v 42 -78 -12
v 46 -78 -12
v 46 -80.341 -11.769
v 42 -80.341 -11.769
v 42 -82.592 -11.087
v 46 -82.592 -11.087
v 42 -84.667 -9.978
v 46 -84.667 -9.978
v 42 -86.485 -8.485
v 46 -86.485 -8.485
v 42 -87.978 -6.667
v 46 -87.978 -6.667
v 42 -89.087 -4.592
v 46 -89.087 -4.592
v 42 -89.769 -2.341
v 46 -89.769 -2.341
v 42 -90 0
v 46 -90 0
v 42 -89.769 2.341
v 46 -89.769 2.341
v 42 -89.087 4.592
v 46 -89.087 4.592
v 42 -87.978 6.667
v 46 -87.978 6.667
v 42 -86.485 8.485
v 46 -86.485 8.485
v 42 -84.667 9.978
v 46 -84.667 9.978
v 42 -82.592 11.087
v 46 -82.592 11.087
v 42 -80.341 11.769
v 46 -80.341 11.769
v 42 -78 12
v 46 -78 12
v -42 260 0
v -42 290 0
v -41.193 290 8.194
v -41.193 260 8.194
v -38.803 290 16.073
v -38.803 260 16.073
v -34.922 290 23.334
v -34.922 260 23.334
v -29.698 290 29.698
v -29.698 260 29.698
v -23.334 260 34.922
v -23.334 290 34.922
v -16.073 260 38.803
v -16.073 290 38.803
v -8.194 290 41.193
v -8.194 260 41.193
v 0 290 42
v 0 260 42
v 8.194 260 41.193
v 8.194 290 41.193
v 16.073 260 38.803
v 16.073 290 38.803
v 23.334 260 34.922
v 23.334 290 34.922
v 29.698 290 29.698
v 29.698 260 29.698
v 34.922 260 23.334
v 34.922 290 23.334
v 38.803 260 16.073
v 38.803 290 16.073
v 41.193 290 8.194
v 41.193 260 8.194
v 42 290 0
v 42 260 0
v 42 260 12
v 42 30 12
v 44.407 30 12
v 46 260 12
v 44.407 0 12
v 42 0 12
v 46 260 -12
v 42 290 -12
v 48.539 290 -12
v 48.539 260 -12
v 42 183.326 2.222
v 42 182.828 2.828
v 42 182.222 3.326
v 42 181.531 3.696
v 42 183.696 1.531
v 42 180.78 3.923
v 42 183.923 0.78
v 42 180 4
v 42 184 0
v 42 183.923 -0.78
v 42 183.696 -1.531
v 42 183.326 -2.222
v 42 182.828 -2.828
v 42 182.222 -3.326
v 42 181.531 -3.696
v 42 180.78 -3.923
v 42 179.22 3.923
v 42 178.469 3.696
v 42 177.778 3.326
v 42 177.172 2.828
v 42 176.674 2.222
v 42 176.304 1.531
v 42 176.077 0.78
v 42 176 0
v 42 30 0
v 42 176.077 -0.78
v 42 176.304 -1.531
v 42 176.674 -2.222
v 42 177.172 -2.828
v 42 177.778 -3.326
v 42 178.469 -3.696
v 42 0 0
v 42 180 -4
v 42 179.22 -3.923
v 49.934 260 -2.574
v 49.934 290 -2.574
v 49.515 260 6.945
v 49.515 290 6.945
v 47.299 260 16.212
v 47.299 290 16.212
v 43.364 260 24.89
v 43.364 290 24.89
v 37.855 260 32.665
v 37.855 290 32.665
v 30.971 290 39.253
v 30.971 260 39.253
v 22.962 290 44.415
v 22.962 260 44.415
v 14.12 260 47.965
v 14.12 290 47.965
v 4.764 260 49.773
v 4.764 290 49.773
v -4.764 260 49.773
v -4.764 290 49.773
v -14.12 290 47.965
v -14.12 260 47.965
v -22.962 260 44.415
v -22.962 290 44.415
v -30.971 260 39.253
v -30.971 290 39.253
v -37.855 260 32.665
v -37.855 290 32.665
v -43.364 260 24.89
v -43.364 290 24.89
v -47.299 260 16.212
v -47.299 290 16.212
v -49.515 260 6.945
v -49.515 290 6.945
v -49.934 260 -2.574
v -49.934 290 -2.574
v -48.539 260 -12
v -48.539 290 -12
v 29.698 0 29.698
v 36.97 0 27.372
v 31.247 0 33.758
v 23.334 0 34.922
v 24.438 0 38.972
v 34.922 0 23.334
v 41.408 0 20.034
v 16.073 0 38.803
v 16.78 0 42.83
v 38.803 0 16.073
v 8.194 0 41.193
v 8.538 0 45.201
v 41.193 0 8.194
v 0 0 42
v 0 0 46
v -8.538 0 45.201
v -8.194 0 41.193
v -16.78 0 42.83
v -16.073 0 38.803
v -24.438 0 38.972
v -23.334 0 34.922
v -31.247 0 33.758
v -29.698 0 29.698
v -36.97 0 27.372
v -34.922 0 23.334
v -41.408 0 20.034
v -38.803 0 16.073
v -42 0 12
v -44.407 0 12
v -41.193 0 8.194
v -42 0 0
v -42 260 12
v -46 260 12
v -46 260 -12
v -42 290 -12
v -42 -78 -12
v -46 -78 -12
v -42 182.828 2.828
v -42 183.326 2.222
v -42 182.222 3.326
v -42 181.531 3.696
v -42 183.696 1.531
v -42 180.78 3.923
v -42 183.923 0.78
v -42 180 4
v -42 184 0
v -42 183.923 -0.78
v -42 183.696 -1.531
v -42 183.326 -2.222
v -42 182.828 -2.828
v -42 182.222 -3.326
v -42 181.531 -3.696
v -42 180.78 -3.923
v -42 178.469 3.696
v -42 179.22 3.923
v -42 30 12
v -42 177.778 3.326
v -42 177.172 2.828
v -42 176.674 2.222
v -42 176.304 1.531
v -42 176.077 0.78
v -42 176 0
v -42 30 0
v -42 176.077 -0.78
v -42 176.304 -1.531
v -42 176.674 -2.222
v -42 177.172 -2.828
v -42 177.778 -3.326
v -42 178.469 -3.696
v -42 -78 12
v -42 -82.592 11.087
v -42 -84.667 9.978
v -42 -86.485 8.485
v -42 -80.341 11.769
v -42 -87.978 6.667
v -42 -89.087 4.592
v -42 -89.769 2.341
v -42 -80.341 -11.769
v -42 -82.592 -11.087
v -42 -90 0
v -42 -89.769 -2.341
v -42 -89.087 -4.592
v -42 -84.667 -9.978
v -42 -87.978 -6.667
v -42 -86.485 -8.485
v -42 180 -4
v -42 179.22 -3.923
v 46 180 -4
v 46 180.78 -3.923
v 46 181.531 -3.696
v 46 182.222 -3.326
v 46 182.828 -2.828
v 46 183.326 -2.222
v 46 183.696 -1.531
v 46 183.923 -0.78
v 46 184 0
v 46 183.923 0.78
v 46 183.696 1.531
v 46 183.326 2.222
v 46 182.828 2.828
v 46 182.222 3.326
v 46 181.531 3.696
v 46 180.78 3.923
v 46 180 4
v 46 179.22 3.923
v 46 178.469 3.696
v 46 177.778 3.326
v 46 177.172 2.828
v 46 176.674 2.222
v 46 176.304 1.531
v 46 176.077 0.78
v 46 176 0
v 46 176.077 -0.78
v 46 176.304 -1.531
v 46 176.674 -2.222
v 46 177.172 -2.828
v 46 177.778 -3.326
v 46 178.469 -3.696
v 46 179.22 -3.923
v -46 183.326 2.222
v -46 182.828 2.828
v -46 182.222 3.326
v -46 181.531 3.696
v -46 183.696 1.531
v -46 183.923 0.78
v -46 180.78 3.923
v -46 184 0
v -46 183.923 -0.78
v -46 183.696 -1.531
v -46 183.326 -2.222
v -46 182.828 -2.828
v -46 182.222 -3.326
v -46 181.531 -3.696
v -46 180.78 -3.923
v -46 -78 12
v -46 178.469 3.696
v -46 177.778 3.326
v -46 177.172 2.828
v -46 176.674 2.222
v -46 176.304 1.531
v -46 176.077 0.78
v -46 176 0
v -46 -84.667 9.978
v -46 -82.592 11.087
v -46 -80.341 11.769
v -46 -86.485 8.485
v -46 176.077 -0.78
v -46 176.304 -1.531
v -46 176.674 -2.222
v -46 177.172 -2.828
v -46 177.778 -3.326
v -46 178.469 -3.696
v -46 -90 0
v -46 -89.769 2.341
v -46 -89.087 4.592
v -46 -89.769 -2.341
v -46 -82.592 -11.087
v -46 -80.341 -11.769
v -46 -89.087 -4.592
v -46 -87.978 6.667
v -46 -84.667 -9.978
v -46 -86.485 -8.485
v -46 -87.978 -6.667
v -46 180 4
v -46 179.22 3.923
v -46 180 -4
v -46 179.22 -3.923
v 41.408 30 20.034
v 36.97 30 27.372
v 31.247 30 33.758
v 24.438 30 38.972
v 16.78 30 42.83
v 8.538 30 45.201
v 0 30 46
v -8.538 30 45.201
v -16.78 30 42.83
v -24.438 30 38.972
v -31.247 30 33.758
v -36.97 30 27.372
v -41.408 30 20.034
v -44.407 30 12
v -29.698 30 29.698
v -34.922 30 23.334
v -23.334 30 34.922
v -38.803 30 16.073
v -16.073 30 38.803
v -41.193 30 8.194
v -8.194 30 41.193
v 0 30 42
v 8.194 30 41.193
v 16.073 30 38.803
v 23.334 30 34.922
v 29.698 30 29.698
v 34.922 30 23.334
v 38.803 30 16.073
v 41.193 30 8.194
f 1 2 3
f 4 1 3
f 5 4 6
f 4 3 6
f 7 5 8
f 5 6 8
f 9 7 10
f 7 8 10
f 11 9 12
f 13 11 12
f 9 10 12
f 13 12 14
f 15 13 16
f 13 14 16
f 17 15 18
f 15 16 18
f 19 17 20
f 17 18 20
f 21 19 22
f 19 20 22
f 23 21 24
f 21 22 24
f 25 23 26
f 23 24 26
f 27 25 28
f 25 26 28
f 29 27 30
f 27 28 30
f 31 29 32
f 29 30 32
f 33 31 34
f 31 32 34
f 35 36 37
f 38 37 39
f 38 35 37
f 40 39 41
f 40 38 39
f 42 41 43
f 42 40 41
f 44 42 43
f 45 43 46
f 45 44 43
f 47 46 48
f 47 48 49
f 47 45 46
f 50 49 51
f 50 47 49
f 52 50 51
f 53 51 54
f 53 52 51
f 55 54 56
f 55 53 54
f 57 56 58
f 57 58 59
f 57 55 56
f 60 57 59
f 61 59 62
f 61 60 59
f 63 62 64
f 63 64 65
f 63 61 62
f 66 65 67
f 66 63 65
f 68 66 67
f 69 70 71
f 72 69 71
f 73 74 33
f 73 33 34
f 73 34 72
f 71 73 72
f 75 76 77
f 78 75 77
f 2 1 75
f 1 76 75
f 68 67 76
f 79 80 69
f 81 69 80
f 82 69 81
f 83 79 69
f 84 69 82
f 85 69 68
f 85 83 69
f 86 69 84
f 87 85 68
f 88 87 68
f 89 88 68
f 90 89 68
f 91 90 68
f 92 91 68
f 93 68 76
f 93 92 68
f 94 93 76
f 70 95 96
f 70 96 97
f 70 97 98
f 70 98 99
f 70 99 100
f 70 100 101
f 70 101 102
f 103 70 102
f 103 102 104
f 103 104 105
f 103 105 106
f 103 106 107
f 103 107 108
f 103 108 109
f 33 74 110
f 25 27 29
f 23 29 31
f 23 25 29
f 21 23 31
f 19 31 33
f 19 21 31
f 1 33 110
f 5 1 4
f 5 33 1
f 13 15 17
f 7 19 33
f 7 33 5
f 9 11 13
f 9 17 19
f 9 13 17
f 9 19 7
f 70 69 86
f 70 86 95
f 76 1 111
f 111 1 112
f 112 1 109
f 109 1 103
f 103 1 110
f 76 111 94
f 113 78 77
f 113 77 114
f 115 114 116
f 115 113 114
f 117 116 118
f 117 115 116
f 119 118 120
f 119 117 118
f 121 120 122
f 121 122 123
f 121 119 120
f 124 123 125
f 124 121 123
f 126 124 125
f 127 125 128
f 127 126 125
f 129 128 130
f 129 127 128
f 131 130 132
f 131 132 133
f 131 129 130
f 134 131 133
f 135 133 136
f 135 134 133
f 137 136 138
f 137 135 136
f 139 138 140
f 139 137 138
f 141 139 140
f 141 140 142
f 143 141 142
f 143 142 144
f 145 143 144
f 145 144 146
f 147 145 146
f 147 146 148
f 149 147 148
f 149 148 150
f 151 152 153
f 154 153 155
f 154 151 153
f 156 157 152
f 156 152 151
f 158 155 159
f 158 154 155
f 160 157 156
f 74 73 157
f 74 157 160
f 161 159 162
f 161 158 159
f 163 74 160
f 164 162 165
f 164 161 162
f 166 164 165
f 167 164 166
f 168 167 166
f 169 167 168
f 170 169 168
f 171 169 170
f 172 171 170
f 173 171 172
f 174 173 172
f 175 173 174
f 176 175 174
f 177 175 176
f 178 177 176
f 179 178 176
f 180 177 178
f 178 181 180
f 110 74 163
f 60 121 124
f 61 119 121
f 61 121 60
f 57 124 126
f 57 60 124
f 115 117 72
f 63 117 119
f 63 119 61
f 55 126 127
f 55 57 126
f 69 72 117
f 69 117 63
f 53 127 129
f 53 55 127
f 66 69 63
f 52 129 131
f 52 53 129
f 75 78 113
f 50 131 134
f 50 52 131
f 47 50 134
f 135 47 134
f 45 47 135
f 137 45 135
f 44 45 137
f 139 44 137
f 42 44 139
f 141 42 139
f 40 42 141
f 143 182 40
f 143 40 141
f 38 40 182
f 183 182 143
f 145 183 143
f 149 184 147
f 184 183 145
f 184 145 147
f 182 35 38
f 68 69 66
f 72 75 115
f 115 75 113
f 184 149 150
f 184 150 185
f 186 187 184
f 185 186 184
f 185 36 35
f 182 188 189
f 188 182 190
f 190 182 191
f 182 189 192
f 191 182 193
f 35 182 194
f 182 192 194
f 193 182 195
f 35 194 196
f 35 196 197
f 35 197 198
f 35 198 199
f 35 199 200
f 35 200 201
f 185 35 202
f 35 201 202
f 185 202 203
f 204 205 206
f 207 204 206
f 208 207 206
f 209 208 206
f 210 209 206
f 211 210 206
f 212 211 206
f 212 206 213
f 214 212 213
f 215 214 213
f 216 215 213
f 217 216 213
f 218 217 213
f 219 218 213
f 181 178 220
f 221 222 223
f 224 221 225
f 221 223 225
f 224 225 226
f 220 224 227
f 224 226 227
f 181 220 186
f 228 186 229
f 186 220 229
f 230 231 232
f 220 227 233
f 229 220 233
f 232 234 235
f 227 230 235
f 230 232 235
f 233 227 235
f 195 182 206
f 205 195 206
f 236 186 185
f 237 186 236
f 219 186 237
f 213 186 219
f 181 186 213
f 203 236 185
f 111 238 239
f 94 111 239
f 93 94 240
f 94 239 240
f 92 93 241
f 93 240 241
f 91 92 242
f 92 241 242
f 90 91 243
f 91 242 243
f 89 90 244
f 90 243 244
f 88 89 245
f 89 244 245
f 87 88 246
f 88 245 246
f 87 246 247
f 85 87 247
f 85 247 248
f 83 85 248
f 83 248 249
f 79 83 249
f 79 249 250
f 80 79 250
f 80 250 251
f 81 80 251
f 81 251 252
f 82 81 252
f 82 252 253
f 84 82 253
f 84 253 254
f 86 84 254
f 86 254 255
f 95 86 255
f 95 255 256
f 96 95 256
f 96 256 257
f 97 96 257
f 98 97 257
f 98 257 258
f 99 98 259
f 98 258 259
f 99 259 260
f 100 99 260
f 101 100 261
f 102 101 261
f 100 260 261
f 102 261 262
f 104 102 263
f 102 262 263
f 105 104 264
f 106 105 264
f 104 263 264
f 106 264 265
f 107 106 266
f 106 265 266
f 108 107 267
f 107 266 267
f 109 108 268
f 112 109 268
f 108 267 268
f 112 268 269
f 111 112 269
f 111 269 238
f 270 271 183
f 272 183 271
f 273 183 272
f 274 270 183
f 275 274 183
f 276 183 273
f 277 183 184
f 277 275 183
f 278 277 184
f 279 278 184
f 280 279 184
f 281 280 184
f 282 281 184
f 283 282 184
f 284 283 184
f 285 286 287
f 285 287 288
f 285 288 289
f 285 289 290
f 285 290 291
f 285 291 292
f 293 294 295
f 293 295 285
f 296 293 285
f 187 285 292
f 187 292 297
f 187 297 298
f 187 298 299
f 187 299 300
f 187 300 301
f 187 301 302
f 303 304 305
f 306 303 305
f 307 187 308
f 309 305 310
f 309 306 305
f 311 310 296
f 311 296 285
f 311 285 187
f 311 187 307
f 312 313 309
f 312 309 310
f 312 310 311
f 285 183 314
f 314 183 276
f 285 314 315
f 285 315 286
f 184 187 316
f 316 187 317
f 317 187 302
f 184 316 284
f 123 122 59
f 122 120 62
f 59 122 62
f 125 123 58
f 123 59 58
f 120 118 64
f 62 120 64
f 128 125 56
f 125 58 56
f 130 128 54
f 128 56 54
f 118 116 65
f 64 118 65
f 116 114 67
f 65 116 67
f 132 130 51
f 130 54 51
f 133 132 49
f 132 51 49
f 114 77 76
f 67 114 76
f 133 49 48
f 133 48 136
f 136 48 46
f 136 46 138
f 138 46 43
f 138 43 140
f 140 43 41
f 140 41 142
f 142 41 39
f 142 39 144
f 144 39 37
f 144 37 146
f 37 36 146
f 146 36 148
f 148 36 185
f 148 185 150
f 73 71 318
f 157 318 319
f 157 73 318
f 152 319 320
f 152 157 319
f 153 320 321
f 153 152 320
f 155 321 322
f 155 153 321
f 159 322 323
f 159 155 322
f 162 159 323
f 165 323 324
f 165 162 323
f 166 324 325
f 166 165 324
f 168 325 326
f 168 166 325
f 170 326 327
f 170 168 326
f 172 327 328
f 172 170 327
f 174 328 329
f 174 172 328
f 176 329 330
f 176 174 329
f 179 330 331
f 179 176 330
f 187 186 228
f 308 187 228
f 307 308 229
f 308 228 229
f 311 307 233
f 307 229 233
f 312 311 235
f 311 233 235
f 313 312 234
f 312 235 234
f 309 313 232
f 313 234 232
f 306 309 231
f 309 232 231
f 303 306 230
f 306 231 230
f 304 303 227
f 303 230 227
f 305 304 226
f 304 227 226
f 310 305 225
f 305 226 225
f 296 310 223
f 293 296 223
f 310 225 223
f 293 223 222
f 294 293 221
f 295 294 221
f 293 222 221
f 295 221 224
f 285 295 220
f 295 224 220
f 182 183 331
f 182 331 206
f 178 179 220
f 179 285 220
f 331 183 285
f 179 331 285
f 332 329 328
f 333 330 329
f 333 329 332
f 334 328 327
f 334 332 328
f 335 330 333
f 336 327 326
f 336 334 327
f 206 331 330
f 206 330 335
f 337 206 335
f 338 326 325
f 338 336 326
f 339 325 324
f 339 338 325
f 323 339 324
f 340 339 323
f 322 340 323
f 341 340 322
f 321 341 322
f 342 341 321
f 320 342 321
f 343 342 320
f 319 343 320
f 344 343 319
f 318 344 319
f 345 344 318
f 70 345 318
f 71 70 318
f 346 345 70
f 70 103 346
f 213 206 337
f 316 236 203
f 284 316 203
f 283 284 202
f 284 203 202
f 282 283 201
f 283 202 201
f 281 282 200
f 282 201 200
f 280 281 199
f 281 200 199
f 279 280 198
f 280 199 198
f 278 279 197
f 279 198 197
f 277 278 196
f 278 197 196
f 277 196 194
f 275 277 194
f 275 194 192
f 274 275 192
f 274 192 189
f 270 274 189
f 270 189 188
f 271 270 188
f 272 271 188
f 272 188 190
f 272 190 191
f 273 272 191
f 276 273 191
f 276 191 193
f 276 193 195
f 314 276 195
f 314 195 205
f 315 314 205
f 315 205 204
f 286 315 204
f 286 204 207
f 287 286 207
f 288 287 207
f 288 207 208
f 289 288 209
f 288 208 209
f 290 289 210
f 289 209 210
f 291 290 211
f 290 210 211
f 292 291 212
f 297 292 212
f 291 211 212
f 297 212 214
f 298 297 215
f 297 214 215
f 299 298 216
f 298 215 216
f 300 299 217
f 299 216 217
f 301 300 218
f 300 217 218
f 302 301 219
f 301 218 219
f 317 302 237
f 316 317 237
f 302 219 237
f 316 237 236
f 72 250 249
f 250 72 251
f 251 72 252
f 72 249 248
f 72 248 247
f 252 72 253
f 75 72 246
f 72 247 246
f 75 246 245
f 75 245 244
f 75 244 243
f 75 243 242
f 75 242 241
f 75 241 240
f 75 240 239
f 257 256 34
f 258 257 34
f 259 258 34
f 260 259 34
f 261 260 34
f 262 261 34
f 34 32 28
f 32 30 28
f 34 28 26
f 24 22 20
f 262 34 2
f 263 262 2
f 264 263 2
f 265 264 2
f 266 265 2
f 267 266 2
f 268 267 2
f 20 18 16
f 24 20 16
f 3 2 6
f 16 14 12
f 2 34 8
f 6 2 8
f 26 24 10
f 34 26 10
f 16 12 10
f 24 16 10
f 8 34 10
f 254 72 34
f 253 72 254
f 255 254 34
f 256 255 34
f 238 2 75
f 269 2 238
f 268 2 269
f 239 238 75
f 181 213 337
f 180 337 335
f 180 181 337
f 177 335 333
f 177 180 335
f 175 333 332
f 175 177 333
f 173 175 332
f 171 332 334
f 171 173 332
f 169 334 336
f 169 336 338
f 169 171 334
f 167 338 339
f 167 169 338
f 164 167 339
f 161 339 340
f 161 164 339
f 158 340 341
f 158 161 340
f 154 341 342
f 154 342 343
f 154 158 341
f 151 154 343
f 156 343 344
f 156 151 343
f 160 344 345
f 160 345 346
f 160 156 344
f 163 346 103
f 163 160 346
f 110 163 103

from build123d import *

# Parameters (mm, degrees)
EXTRUDE_1_DEPTH     = 30
SKETCH_2_W          = 4
SKETCH_2_H          = 24
EXTRUDE_2_DEPTH     = 120
CUT_EXTRUDE_1_DEPTH = 137.674796506
SKETCH_4_W          = 4
SKETCH_4_H          = 24
EXTRUDE_3_DEPTH     = 260
EXTRUDE_START       = -30
EXTRUDE_4_DEPTH     = 30
SKETCH_6_R          = 4
CUT_EXTRUDE_2_DEPTH = 310.541596559


with BuildPart() as part:
    # 草图1 → 凸台-拉伸1 (new body)
    with BuildSketch(Plane(origin=(0, 0, 0), x_dir=(1, 0, 0), z_dir=(0, 1, 0))):
        with BuildLine():
            Line((-46, 0), (-46, 12))
            Line((-46, 12), (-42, 12))
            Line((-42, 12), (-42, 0))
            ThreePointArc((-42, 0), (0, -42), (42, 0))
            Line((42, 0), (42, 12))
            Line((42, 12), (46, 12))
            Line((46, 12), (46, 0))
            ThreePointArc((46, 0), (0, -46), (-46, 0))
        make_face()
    extrude(amount=EXTRUDE_1_DEPTH)

    # 草图2 → 凸台-拉伸2 (add)
    with BuildSketch(Plane(origin=(0, 30, 0), x_dir=(1, 0, 0), z_dir=(0, 1, 0))):
        with Locations((-44, 0)):
            Rectangle(SKETCH_2_W, SKETCH_2_H)
        with Locations((44, 0)):
            Rectangle(SKETCH_2_W, SKETCH_2_H)
    extrude(amount=-EXTRUDE_2_DEPTH)

    # 草图3 → 切除-拉伸1 (cut, through all)
    with BuildSketch(Plane(origin=(46, 0, 0), x_dir=(0, 0, -1), z_dir=(1, 0, 0))):
        with BuildLine():
            Line((-12, -78), (-12, -98.506149354))
            Line((-12, -98.506149354), (12, -98.506149354))
            Line((12, -98.506149354), (12, -78))
            ThreePointArc((12, -78), (0, -90), (-12, -78))
        make_face()
    extrude(amount=-CUT_EXTRUDE_1_DEPTH, mode=Mode.SUBTRACT)

    # 草图4 → 凸台-拉伸3 (add)
    with BuildSketch(Plane(origin=(0, 30, 0), x_dir=(1, 0, 0), z_dir=(0, 1, 0))):
        with Locations((44, 0)):
            Rectangle(SKETCH_4_W, SKETCH_4_H)
        with Locations((-44, 0)):
            Rectangle(SKETCH_4_W, SKETCH_4_H)
    extrude(amount=EXTRUDE_3_DEPTH)

    # 草图5 → 凸台-拉伸4 (add)
    with BuildSketch(Plane(origin=(0, 290, 0), x_dir=(1, 0, 0), z_dir=(0, 1, 0)).offset(EXTRUDE_START)):
        with BuildLine():
            Line((-48.538644398, 12), (-42, 12))
            Line((-42, 12), (-42, 0))
            ThreePointArc((-42, 0), (0, -42), (42, 0))
            Line((42, 0), (42, 12))
            Line((42, 12), (48.538644398, 12))
            ThreePointArc((48.538644398, 12), (0, -50), (-48.538644398, 12))
        make_face()
    extrude(amount=EXTRUDE_4_DEPTH)

    # 草图6 → 切除-拉伸2 (cut, through all)
    with BuildSketch(Plane(origin=(46, 0, 0), x_dir=(0, 0, -1), z_dir=(1, 0, 0))):
        with Locations((0, 180)):
            Circle(SKETCH_6_R)
    extrude(amount=-CUT_EXTRUDE_2_DEPTH, mode=Mode.SUBTRACT)


solid = part.part
